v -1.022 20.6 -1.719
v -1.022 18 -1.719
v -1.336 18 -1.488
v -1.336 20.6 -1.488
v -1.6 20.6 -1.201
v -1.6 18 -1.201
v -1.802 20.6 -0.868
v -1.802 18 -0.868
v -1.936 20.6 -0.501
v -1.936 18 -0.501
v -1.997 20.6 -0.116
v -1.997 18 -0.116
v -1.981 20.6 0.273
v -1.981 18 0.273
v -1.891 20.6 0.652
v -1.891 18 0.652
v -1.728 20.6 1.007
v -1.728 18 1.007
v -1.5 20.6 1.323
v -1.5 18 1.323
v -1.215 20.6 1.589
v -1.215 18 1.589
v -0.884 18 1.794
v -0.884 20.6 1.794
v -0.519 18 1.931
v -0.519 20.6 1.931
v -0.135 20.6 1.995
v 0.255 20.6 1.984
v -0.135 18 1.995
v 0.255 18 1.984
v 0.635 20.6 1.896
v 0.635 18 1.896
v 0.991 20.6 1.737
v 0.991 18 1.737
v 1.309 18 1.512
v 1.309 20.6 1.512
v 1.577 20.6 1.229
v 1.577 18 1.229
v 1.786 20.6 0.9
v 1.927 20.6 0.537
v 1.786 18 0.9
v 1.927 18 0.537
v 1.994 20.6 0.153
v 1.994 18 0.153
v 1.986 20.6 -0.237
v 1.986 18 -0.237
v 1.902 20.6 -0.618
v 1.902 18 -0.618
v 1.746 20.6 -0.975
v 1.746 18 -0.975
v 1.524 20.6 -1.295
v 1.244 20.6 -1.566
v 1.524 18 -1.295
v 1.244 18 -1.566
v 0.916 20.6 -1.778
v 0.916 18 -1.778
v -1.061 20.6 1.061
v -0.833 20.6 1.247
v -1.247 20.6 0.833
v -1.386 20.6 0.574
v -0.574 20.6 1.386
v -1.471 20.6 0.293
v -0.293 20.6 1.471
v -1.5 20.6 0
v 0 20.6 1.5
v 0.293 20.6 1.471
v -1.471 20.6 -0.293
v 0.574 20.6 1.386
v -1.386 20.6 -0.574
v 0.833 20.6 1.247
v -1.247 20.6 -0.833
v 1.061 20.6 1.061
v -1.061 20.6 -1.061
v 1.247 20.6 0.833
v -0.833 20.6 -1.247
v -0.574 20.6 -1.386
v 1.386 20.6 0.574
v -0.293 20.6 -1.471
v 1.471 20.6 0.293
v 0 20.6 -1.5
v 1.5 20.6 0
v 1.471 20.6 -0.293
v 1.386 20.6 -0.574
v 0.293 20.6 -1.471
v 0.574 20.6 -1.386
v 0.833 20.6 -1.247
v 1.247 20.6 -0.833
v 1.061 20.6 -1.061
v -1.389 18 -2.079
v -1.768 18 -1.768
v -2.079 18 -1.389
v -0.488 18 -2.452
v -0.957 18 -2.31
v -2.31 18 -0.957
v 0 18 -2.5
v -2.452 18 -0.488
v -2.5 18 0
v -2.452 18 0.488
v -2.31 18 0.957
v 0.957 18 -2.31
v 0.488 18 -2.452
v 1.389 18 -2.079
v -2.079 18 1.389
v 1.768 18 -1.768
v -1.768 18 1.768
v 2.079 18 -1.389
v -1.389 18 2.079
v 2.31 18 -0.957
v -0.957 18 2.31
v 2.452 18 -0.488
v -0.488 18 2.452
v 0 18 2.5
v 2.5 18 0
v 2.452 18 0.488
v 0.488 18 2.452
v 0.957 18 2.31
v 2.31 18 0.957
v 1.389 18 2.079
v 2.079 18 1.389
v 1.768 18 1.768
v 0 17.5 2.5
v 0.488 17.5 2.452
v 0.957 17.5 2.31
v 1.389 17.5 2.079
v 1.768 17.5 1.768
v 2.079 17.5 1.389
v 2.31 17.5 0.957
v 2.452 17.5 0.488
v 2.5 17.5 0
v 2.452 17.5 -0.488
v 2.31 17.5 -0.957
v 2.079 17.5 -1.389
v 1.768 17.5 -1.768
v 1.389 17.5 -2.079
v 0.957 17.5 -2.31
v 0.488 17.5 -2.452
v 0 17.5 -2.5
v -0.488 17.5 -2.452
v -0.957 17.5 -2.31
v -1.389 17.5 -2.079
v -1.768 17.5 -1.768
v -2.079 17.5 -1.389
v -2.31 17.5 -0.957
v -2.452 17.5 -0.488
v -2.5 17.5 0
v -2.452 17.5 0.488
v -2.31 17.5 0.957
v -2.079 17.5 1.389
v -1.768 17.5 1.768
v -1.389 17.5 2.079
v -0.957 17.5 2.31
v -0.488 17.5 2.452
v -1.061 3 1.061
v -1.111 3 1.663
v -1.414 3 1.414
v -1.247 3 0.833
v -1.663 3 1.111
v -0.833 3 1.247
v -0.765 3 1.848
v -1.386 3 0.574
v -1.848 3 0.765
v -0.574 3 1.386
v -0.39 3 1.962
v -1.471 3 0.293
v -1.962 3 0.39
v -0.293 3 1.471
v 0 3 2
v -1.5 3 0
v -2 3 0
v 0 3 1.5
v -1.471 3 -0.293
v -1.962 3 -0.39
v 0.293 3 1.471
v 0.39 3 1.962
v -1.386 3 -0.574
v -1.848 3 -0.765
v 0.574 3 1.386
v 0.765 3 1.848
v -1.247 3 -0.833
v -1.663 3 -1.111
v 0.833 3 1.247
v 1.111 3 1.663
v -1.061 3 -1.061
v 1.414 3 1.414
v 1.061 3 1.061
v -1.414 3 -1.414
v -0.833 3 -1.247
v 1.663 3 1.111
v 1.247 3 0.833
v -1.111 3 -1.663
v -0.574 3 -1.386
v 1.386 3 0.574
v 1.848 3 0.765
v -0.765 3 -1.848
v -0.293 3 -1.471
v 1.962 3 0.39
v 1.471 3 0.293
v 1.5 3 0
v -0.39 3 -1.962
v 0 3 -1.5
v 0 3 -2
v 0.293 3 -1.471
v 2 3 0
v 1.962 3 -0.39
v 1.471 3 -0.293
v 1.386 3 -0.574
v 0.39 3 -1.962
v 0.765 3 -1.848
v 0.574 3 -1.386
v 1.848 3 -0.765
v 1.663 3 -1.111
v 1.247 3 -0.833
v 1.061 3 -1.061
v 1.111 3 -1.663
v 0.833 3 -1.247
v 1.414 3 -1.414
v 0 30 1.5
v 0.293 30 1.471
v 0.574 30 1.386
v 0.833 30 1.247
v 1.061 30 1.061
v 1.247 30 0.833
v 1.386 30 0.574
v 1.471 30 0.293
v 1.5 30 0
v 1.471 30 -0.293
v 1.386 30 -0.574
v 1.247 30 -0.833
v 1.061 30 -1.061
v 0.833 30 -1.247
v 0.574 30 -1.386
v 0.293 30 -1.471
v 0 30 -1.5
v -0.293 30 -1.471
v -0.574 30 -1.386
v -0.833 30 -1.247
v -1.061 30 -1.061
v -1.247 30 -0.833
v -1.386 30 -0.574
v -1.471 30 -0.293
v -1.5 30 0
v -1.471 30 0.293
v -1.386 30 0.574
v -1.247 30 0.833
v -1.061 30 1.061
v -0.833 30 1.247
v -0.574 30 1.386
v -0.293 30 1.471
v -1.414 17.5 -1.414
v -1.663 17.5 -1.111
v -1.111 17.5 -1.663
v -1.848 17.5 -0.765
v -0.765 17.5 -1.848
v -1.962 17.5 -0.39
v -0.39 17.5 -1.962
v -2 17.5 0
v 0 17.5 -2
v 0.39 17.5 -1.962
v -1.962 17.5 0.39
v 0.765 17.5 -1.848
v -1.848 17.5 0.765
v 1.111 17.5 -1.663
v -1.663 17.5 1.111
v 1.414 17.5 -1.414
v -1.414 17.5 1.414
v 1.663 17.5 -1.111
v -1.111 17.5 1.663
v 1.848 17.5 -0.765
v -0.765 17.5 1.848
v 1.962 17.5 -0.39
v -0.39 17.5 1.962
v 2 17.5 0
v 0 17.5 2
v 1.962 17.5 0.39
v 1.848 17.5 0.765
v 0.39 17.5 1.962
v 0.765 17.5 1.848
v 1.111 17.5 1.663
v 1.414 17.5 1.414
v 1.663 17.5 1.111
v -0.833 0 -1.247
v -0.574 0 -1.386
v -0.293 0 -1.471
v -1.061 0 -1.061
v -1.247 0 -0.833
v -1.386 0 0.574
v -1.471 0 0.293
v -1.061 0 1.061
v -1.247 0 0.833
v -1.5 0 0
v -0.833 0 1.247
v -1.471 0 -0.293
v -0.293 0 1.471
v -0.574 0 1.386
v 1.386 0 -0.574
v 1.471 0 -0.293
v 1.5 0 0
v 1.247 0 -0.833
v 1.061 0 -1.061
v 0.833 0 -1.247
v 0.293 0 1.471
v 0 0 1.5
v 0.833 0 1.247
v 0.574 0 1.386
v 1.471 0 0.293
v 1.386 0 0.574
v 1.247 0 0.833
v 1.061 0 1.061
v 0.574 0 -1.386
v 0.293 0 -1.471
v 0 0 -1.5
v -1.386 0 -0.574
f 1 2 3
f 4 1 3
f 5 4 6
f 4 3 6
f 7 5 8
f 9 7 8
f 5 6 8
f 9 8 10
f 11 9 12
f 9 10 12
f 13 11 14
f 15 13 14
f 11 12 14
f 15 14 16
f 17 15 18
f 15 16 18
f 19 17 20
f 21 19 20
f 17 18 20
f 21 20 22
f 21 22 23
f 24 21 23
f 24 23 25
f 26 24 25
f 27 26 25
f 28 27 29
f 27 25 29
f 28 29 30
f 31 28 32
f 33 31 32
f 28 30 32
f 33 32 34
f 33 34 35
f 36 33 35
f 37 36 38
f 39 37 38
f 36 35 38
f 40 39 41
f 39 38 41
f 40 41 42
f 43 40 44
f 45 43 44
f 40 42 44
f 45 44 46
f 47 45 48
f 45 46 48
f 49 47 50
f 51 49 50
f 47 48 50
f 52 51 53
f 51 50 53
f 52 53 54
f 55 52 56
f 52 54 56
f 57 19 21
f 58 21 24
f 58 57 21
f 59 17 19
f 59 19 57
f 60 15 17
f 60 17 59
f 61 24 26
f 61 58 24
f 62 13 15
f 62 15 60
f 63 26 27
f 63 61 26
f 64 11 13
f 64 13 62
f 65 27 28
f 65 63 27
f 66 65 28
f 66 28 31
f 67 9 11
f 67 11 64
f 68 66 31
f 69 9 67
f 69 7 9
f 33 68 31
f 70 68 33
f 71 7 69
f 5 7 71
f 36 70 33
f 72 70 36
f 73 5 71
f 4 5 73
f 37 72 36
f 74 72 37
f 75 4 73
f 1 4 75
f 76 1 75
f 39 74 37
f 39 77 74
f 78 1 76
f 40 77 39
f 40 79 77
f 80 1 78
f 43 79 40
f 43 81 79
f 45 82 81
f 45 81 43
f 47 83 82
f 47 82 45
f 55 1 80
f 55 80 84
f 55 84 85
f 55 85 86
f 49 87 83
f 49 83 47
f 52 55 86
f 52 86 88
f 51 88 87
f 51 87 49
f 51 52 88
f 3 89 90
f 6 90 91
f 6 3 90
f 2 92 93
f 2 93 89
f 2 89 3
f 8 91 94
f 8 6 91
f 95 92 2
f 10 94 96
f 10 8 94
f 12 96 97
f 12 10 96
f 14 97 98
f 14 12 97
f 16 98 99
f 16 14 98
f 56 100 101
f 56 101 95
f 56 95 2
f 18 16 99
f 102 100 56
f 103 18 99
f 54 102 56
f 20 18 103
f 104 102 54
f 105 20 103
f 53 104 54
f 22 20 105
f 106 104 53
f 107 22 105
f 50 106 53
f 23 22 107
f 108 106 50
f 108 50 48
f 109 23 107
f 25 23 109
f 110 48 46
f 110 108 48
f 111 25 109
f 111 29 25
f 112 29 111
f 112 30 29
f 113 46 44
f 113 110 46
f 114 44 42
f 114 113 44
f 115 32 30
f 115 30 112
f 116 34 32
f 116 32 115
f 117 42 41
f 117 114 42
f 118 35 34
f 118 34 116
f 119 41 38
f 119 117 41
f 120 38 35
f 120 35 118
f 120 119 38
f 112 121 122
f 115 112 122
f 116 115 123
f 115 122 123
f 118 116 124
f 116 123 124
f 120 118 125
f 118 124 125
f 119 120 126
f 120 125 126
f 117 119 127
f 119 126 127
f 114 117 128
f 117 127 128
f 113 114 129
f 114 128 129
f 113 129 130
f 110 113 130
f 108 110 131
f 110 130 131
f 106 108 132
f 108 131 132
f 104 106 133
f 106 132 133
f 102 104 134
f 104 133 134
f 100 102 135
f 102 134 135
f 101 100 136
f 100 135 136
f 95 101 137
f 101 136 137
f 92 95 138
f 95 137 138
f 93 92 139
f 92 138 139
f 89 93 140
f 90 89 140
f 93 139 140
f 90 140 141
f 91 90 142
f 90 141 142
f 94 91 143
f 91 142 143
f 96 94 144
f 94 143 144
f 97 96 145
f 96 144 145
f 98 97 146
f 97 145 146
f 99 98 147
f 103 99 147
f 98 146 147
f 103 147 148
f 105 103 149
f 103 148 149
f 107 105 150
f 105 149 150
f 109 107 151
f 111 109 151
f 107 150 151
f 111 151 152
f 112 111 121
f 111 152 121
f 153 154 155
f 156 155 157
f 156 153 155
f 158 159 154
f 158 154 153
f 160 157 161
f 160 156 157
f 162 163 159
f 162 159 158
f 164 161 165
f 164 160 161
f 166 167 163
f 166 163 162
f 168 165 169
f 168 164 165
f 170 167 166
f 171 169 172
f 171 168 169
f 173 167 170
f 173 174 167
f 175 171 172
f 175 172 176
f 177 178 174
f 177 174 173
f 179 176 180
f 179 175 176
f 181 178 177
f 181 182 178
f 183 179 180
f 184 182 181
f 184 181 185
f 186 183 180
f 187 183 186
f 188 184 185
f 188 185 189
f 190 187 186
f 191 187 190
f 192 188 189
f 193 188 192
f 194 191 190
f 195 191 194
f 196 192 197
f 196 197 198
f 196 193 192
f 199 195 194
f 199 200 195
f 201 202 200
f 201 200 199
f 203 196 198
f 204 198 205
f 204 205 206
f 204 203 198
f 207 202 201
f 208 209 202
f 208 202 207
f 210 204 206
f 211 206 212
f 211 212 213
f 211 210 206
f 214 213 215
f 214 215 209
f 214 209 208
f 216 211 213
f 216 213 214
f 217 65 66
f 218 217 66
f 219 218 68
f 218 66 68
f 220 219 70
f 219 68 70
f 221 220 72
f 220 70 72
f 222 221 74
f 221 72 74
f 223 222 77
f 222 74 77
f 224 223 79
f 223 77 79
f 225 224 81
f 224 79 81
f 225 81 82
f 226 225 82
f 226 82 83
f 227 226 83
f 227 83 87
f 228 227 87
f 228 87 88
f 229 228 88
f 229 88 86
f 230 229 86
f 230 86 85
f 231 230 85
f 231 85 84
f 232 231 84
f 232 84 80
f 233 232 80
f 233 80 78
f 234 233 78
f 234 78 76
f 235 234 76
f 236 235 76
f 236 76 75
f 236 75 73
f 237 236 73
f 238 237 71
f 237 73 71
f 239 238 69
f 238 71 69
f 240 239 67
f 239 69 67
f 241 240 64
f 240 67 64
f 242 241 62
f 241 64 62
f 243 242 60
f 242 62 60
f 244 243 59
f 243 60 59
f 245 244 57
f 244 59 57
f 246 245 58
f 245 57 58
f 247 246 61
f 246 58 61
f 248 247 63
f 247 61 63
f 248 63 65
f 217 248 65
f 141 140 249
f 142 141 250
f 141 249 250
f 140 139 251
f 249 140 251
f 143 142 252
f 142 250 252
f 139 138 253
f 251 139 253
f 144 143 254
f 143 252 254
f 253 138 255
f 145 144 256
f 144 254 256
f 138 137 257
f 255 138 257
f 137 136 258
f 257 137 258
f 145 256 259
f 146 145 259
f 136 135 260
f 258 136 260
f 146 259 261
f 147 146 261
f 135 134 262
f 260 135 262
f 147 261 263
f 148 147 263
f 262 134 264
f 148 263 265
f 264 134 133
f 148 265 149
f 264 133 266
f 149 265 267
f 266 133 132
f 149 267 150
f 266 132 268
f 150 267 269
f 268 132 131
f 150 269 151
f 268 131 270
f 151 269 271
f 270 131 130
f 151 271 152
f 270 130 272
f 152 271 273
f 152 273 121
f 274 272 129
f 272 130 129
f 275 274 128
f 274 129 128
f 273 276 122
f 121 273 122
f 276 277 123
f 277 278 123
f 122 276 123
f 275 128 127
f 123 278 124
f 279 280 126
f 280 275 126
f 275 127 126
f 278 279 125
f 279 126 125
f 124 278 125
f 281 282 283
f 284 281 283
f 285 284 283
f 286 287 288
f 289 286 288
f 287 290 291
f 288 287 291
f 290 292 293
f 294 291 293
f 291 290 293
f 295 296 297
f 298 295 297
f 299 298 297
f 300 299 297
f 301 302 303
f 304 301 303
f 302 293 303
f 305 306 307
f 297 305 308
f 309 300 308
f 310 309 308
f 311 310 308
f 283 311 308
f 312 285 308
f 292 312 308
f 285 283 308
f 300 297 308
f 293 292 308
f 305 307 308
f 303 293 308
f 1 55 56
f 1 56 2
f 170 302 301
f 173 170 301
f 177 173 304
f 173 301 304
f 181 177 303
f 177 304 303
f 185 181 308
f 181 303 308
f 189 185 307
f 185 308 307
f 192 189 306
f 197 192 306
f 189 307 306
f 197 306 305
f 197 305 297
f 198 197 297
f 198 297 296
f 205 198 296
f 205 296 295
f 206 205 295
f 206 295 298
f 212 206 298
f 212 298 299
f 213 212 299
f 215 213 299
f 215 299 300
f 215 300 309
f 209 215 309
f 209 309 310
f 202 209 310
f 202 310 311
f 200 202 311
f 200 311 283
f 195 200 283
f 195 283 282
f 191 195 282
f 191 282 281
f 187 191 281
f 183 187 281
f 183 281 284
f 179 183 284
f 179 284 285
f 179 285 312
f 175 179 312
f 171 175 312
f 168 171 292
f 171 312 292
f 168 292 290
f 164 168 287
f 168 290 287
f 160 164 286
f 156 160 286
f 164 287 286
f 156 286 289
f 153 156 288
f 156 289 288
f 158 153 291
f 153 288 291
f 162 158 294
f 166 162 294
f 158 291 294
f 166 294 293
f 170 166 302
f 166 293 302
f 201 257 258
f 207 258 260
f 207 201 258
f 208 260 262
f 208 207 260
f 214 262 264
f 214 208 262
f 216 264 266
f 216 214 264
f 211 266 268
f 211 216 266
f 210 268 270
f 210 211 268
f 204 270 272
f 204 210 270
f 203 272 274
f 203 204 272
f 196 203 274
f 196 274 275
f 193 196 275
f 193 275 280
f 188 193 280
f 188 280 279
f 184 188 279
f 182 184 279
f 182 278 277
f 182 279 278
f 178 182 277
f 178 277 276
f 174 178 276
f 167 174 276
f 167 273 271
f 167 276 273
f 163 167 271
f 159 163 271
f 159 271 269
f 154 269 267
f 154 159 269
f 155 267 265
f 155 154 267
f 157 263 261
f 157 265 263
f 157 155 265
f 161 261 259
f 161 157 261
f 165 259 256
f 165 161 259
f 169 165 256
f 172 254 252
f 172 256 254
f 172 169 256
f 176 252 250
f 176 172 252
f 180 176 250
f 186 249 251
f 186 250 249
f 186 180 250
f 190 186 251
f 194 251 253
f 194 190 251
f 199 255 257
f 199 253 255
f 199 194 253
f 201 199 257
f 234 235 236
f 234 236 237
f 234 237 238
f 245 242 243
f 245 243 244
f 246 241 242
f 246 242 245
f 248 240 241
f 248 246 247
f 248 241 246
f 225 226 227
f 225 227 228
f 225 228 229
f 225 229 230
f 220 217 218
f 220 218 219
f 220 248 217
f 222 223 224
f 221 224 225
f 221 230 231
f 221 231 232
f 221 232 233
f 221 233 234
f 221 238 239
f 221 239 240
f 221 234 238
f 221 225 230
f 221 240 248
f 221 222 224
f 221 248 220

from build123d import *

# Parameters (mm, degrees)
SKETCH_1_R      = 1.5
EXTRUDE_1_DEPTH = 30
EXTRUDE_START   = 15
SKETCH_2_R      = 2
SKETCH_2_R_2    = 1.5
EXTRUDE_2_DEPTH = 15
SKETCH_3_R      = 1.5
EXTRUDE_3_DEPTH = 2.6
EXTRUDE_START_2 = -0.5
SKETCH_4_R      = 2.5
SKETCH_4_R_2    = 2
EXTRUDE_4_DEPTH = 0.5


with BuildPart() as part:
    # 草图1 → 凸台-拉伸1 (new body)
    with BuildSketch(Plane(origin=(0, 0, 0), x_dir=(1, 0, 0), z_dir=(0, 1, 0))):
        with Locations(Location((0, 0, 0), (0, 0, 270))):
            Circle(SKETCH_1_R)
    extrude(amount=EXTRUDE_1_DEPTH)

    # 草图2 → 凸台-拉伸2 (add)
    with BuildSketch(Plane(origin=(0, 18, 0), x_dir=(-1, 0, 0), z_dir=(0, -1, 0)).offset(EXTRUDE_START)):
        with Locations(Location((0, 0, 0), (0, 0, 90))):
            Circle(SKETCH_2_R)
        with Locations(Location((0, 0, 0), (0, 0, 90))):
            Circle(SKETCH_2_R_2, mode=Mode.SUBTRACT)
    extrude(amount=-EXTRUDE_2_DEPTH)

    # 草图3 → 凸台-拉伸3 (add)
    with BuildSketch(Plane(origin=(0, 18, 0), x_dir=(1, 0, 0), z_dir=(0, 1, 0))):
        with BuildLine():
            Line((0.91625301, 1.777774007), (-1.022249701, 1.719012958))
            ThreePointArc((-1.022249701, 1.719012958), (0.060597358, -1.999081779), (0.91625301, 1.777774007))
        make_face()
        with Locations(Location((0, 0, 0), (0, 0, 90))):
            Circle(SKETCH_3_R, mode=Mode.SUBTRACT)
    extrude(amount=EXTRUDE_3_DEPTH)

    # 草图4 → 凸台-拉伸4 (add)
    with BuildSketch(Plane(origin=(0, 18, 0), x_dir=(1, 0, 0), z_dir=(0, 1, 0)).offset(EXTRUDE_START_2)):
        with Locations(Location((0, 0, 0), (0, 0, 270))):
            Circle(SKETCH_4_R)
        with Locations(Location((0, 0, 0), (0, 0, 270))):
            Circle(SKETCH_4_R_2, mode=Mode.SUBTRACT)
    extrude(amount=EXTRUDE_4_DEPTH)


solid = part.part
